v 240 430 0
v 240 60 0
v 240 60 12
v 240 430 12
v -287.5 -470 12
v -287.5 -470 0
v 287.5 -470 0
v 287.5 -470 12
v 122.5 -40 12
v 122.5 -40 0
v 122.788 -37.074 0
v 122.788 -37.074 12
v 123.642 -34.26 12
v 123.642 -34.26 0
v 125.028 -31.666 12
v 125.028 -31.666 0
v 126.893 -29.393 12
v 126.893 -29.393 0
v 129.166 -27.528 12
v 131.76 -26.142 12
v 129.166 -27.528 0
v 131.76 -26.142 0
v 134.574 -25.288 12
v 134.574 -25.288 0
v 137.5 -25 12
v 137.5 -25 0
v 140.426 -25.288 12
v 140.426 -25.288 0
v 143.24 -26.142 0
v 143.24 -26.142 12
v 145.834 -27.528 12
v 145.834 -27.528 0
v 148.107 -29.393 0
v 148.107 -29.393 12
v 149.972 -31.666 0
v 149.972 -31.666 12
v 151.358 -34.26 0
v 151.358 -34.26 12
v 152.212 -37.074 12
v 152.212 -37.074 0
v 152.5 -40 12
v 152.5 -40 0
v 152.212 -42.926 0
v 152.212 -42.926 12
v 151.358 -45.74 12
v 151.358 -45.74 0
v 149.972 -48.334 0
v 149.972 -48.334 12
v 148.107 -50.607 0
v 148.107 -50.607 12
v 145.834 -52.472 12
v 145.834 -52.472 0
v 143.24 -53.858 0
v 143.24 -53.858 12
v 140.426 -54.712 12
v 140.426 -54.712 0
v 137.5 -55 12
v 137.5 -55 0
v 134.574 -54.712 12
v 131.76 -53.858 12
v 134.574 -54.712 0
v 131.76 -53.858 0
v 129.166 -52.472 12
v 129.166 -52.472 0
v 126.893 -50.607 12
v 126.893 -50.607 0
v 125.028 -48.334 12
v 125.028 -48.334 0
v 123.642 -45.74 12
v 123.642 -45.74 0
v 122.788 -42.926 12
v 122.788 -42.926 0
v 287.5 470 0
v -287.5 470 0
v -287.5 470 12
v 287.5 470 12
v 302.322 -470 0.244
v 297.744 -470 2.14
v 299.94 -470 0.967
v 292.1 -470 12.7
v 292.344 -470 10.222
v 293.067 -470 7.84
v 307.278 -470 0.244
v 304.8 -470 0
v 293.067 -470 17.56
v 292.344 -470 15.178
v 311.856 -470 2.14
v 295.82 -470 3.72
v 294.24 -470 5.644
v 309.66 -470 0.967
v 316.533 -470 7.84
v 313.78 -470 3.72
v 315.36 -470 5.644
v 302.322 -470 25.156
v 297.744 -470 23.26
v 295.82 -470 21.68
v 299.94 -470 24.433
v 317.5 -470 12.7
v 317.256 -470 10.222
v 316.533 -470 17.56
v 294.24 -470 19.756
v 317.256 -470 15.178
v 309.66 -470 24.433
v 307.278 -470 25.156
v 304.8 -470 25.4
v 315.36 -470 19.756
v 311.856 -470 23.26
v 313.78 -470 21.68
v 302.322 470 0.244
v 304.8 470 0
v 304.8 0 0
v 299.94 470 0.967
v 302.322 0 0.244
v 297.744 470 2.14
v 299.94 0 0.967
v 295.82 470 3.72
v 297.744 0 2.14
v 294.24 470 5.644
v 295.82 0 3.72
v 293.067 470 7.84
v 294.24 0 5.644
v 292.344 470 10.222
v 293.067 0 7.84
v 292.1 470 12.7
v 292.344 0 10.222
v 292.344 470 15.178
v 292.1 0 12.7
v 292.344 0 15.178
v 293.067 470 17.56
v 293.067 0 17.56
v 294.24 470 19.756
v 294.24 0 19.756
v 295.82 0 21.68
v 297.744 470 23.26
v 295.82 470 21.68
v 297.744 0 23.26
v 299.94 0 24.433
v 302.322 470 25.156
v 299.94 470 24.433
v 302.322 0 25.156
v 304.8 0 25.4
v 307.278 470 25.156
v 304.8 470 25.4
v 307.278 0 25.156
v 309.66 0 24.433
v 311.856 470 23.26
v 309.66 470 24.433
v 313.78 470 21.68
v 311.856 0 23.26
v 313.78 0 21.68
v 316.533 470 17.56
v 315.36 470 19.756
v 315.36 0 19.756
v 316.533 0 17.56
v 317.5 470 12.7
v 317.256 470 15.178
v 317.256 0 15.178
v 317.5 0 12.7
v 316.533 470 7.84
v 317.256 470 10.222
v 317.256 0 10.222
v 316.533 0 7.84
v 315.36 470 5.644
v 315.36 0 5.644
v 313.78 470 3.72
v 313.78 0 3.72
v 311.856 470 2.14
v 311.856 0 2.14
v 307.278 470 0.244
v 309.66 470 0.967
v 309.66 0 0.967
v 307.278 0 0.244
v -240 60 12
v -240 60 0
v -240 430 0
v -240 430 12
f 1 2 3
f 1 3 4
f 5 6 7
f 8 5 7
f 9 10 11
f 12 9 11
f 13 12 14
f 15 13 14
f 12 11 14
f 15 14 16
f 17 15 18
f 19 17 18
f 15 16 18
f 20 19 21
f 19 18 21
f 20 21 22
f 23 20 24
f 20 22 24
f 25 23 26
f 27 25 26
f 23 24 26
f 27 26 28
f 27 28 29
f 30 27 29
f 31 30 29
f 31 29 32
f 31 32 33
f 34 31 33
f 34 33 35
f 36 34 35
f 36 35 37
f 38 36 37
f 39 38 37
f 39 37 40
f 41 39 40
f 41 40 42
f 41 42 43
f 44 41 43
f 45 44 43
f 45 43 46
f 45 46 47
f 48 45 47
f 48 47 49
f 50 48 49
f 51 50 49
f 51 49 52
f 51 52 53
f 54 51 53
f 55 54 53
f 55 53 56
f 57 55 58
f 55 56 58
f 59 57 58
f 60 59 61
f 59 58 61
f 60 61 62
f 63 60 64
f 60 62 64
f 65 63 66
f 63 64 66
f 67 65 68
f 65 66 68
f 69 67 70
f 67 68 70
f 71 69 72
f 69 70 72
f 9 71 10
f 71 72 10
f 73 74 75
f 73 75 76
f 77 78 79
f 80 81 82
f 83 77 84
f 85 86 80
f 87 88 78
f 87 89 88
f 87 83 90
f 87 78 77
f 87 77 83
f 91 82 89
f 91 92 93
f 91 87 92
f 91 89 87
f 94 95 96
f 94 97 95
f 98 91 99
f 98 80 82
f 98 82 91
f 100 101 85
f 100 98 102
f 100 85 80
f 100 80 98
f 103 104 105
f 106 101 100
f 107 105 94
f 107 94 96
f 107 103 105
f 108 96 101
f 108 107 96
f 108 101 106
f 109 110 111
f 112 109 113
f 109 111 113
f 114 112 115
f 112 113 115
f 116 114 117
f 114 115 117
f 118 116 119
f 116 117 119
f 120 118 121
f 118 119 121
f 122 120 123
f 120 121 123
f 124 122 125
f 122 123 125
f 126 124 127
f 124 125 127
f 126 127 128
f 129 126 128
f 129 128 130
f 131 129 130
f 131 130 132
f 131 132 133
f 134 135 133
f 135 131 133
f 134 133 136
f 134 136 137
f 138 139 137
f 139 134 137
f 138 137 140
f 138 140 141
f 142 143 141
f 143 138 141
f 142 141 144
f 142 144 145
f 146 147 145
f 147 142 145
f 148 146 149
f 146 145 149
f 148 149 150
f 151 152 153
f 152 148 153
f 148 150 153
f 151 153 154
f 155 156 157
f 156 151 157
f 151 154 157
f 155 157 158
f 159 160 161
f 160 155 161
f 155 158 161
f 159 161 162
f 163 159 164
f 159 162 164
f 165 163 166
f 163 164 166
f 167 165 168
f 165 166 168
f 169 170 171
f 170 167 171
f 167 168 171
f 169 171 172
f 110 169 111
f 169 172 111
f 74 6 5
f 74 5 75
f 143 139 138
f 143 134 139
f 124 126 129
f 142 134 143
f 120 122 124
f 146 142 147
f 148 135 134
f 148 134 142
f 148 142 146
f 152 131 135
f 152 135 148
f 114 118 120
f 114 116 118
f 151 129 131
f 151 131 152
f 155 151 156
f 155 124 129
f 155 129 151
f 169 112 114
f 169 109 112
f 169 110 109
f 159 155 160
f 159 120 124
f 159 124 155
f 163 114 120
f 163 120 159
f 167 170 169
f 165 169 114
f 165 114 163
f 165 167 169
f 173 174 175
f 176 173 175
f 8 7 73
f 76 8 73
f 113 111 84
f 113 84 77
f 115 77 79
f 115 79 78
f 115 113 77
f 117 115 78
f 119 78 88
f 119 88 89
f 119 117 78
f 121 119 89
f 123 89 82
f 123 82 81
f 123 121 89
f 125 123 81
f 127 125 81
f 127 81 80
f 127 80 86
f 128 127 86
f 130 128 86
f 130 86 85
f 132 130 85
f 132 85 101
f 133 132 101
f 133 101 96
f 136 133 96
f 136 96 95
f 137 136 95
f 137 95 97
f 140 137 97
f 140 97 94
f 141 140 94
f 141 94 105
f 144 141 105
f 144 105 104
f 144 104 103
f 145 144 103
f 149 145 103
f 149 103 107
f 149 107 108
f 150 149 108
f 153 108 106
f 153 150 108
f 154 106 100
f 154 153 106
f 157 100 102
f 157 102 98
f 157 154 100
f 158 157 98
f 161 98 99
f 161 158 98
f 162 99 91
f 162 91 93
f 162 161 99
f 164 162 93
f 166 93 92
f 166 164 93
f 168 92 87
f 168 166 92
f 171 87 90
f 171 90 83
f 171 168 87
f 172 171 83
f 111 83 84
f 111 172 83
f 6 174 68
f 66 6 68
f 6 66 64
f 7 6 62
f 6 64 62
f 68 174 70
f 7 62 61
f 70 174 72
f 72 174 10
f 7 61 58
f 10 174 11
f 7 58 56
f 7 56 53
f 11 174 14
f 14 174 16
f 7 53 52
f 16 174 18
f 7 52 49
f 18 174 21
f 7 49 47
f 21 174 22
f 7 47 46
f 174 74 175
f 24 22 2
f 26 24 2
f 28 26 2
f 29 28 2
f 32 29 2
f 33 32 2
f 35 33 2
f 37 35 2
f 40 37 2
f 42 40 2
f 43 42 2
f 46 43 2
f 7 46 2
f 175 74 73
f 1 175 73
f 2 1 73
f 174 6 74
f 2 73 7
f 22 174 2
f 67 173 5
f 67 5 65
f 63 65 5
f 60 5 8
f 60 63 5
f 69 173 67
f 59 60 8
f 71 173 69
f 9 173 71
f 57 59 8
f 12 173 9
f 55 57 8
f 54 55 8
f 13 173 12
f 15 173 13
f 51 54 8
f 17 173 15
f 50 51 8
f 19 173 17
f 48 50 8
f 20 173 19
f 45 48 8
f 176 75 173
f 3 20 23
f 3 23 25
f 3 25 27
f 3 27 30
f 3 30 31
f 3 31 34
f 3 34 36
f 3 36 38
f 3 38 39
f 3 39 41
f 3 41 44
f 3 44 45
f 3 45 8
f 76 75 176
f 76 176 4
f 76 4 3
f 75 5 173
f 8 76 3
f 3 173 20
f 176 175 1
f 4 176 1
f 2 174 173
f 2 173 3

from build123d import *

# Parameters (mm, degrees)
SKETCH1_W                       = 575
SKETCH1_H                       = 940
SKETCH1_W_2                     = 480
SKETCH1_H_2                     = 370
BOSS_EXTRUDE1_DEPTH             = 12
BOSS_EXTRUDE2_REACH             = 553.09
SKETCH2_R                       = 12.7
BOSS_EXTRUDE2_DIRECTION_2_REACH = 553.09
SKETCH3_R                       = 12.5
SKETCH3_R_2                     = 15
CUT_EXTRUDE1_DEPTH              = 568.759993307


with BuildPart() as part:
    # Sketch1 → Boss-Extrude1 (new body)
    with BuildSketch(Plane.XY):
        Rectangle(SKETCH1_W, SKETCH1_H)
        with Locations((0, 245)):
            Rectangle(SKETCH1_W_2, SKETCH1_H_2, mode=Mode.SUBTRACT)
    extrude(amount=BOSS_EXTRUDE1_DEPTH)


with BuildPart() as body_2:

    # Boss-Extrude2: up to this face of the body (flat: up to its plane)
    boss_extrude2_end = Plane(part.part.faces().sort_by_distance((0, 470, 6))[0])
    # Sketch2 → Boss-Extrude2 (new, up to the picked face)
    with BuildSketch(Plane(origin=(0, 0, 0), x_dir=(1, 0, 0), z_dir=(0, 1, 0)), mode=Mode.PRIVATE) as boss_extrude2_sk1:
        with Locations(Location((304.8, -12.7, 0), (0, 0, 90))):
            Circle(SKETCH2_R)
    boss_extrude2_tool1 = split(extrude(boss_extrude2_sk1.sketch, amount=BOSS_EXTRUDE2_REACH, mode=Mode.PRIVATE), bisect_by=boss_extrude2_end, keep=Keep.BOTH, mode=Mode.PRIVATE)
    add(boss_extrude2_tool1.solids().sort_by(Axis((304.8, 0, 12.7), (0, 1, 0)))[0])


    # Boss-Extrude2 direction 2: up to this face of the body (flat: up to its plane)
    boss_extrude2_direction_2_end = Plane(part.part.faces().sort_by_distance((0, -470, 6))[0])
    # Sketch2 → Boss-Extrude2 direction 2 (add, up to the picked face)
    with BuildSketch(Plane(origin=(0, 0, 0), x_dir=(1, 0, 0), z_dir=(0, 1, 0)), mode=Mode.PRIVATE) as boss_extrude2_direction_2_sk1:
        with Locations(Location((304.8, -12.7, 0), (0, 0, 90))):
            Circle(SKETCH2_R)
    boss_extrude2_direction_2_tool1 = split(extrude(boss_extrude2_direction_2_sk1.sketch, amount=-BOSS_EXTRUDE2_DIRECTION_2_REACH, mode=Mode.PRIVATE), bisect_by=boss_extrude2_direction_2_end, keep=Keep.BOTH, mode=Mode.PRIVATE)
    add(boss_extrude2_direction_2_tool1.solids().sort_by(Axis((304.8, 0, 12.7), (0, -1, 0)))[0])


with BuildPart() as part_1:
    add(part.part)

    # Sketch3 → Cut-Extrude1 (cut, through all)
    with BuildSketch(Plane(origin=(0, 0, 0), x_dir=(-1, 0, 0), z_dir=(0, 0, -1))):
        with Locations((-137.5, -40)):
            Circle(SKETCH3_R)
        with Locations((-137.5, -40)):
            Circle(SKETCH3_R_2)
    extrude(amount=-CUT_EXTRUDE1_DEPTH, mode=Mode.SUBTRACT)


solid = Compound([body_2.part, part_1.part])
